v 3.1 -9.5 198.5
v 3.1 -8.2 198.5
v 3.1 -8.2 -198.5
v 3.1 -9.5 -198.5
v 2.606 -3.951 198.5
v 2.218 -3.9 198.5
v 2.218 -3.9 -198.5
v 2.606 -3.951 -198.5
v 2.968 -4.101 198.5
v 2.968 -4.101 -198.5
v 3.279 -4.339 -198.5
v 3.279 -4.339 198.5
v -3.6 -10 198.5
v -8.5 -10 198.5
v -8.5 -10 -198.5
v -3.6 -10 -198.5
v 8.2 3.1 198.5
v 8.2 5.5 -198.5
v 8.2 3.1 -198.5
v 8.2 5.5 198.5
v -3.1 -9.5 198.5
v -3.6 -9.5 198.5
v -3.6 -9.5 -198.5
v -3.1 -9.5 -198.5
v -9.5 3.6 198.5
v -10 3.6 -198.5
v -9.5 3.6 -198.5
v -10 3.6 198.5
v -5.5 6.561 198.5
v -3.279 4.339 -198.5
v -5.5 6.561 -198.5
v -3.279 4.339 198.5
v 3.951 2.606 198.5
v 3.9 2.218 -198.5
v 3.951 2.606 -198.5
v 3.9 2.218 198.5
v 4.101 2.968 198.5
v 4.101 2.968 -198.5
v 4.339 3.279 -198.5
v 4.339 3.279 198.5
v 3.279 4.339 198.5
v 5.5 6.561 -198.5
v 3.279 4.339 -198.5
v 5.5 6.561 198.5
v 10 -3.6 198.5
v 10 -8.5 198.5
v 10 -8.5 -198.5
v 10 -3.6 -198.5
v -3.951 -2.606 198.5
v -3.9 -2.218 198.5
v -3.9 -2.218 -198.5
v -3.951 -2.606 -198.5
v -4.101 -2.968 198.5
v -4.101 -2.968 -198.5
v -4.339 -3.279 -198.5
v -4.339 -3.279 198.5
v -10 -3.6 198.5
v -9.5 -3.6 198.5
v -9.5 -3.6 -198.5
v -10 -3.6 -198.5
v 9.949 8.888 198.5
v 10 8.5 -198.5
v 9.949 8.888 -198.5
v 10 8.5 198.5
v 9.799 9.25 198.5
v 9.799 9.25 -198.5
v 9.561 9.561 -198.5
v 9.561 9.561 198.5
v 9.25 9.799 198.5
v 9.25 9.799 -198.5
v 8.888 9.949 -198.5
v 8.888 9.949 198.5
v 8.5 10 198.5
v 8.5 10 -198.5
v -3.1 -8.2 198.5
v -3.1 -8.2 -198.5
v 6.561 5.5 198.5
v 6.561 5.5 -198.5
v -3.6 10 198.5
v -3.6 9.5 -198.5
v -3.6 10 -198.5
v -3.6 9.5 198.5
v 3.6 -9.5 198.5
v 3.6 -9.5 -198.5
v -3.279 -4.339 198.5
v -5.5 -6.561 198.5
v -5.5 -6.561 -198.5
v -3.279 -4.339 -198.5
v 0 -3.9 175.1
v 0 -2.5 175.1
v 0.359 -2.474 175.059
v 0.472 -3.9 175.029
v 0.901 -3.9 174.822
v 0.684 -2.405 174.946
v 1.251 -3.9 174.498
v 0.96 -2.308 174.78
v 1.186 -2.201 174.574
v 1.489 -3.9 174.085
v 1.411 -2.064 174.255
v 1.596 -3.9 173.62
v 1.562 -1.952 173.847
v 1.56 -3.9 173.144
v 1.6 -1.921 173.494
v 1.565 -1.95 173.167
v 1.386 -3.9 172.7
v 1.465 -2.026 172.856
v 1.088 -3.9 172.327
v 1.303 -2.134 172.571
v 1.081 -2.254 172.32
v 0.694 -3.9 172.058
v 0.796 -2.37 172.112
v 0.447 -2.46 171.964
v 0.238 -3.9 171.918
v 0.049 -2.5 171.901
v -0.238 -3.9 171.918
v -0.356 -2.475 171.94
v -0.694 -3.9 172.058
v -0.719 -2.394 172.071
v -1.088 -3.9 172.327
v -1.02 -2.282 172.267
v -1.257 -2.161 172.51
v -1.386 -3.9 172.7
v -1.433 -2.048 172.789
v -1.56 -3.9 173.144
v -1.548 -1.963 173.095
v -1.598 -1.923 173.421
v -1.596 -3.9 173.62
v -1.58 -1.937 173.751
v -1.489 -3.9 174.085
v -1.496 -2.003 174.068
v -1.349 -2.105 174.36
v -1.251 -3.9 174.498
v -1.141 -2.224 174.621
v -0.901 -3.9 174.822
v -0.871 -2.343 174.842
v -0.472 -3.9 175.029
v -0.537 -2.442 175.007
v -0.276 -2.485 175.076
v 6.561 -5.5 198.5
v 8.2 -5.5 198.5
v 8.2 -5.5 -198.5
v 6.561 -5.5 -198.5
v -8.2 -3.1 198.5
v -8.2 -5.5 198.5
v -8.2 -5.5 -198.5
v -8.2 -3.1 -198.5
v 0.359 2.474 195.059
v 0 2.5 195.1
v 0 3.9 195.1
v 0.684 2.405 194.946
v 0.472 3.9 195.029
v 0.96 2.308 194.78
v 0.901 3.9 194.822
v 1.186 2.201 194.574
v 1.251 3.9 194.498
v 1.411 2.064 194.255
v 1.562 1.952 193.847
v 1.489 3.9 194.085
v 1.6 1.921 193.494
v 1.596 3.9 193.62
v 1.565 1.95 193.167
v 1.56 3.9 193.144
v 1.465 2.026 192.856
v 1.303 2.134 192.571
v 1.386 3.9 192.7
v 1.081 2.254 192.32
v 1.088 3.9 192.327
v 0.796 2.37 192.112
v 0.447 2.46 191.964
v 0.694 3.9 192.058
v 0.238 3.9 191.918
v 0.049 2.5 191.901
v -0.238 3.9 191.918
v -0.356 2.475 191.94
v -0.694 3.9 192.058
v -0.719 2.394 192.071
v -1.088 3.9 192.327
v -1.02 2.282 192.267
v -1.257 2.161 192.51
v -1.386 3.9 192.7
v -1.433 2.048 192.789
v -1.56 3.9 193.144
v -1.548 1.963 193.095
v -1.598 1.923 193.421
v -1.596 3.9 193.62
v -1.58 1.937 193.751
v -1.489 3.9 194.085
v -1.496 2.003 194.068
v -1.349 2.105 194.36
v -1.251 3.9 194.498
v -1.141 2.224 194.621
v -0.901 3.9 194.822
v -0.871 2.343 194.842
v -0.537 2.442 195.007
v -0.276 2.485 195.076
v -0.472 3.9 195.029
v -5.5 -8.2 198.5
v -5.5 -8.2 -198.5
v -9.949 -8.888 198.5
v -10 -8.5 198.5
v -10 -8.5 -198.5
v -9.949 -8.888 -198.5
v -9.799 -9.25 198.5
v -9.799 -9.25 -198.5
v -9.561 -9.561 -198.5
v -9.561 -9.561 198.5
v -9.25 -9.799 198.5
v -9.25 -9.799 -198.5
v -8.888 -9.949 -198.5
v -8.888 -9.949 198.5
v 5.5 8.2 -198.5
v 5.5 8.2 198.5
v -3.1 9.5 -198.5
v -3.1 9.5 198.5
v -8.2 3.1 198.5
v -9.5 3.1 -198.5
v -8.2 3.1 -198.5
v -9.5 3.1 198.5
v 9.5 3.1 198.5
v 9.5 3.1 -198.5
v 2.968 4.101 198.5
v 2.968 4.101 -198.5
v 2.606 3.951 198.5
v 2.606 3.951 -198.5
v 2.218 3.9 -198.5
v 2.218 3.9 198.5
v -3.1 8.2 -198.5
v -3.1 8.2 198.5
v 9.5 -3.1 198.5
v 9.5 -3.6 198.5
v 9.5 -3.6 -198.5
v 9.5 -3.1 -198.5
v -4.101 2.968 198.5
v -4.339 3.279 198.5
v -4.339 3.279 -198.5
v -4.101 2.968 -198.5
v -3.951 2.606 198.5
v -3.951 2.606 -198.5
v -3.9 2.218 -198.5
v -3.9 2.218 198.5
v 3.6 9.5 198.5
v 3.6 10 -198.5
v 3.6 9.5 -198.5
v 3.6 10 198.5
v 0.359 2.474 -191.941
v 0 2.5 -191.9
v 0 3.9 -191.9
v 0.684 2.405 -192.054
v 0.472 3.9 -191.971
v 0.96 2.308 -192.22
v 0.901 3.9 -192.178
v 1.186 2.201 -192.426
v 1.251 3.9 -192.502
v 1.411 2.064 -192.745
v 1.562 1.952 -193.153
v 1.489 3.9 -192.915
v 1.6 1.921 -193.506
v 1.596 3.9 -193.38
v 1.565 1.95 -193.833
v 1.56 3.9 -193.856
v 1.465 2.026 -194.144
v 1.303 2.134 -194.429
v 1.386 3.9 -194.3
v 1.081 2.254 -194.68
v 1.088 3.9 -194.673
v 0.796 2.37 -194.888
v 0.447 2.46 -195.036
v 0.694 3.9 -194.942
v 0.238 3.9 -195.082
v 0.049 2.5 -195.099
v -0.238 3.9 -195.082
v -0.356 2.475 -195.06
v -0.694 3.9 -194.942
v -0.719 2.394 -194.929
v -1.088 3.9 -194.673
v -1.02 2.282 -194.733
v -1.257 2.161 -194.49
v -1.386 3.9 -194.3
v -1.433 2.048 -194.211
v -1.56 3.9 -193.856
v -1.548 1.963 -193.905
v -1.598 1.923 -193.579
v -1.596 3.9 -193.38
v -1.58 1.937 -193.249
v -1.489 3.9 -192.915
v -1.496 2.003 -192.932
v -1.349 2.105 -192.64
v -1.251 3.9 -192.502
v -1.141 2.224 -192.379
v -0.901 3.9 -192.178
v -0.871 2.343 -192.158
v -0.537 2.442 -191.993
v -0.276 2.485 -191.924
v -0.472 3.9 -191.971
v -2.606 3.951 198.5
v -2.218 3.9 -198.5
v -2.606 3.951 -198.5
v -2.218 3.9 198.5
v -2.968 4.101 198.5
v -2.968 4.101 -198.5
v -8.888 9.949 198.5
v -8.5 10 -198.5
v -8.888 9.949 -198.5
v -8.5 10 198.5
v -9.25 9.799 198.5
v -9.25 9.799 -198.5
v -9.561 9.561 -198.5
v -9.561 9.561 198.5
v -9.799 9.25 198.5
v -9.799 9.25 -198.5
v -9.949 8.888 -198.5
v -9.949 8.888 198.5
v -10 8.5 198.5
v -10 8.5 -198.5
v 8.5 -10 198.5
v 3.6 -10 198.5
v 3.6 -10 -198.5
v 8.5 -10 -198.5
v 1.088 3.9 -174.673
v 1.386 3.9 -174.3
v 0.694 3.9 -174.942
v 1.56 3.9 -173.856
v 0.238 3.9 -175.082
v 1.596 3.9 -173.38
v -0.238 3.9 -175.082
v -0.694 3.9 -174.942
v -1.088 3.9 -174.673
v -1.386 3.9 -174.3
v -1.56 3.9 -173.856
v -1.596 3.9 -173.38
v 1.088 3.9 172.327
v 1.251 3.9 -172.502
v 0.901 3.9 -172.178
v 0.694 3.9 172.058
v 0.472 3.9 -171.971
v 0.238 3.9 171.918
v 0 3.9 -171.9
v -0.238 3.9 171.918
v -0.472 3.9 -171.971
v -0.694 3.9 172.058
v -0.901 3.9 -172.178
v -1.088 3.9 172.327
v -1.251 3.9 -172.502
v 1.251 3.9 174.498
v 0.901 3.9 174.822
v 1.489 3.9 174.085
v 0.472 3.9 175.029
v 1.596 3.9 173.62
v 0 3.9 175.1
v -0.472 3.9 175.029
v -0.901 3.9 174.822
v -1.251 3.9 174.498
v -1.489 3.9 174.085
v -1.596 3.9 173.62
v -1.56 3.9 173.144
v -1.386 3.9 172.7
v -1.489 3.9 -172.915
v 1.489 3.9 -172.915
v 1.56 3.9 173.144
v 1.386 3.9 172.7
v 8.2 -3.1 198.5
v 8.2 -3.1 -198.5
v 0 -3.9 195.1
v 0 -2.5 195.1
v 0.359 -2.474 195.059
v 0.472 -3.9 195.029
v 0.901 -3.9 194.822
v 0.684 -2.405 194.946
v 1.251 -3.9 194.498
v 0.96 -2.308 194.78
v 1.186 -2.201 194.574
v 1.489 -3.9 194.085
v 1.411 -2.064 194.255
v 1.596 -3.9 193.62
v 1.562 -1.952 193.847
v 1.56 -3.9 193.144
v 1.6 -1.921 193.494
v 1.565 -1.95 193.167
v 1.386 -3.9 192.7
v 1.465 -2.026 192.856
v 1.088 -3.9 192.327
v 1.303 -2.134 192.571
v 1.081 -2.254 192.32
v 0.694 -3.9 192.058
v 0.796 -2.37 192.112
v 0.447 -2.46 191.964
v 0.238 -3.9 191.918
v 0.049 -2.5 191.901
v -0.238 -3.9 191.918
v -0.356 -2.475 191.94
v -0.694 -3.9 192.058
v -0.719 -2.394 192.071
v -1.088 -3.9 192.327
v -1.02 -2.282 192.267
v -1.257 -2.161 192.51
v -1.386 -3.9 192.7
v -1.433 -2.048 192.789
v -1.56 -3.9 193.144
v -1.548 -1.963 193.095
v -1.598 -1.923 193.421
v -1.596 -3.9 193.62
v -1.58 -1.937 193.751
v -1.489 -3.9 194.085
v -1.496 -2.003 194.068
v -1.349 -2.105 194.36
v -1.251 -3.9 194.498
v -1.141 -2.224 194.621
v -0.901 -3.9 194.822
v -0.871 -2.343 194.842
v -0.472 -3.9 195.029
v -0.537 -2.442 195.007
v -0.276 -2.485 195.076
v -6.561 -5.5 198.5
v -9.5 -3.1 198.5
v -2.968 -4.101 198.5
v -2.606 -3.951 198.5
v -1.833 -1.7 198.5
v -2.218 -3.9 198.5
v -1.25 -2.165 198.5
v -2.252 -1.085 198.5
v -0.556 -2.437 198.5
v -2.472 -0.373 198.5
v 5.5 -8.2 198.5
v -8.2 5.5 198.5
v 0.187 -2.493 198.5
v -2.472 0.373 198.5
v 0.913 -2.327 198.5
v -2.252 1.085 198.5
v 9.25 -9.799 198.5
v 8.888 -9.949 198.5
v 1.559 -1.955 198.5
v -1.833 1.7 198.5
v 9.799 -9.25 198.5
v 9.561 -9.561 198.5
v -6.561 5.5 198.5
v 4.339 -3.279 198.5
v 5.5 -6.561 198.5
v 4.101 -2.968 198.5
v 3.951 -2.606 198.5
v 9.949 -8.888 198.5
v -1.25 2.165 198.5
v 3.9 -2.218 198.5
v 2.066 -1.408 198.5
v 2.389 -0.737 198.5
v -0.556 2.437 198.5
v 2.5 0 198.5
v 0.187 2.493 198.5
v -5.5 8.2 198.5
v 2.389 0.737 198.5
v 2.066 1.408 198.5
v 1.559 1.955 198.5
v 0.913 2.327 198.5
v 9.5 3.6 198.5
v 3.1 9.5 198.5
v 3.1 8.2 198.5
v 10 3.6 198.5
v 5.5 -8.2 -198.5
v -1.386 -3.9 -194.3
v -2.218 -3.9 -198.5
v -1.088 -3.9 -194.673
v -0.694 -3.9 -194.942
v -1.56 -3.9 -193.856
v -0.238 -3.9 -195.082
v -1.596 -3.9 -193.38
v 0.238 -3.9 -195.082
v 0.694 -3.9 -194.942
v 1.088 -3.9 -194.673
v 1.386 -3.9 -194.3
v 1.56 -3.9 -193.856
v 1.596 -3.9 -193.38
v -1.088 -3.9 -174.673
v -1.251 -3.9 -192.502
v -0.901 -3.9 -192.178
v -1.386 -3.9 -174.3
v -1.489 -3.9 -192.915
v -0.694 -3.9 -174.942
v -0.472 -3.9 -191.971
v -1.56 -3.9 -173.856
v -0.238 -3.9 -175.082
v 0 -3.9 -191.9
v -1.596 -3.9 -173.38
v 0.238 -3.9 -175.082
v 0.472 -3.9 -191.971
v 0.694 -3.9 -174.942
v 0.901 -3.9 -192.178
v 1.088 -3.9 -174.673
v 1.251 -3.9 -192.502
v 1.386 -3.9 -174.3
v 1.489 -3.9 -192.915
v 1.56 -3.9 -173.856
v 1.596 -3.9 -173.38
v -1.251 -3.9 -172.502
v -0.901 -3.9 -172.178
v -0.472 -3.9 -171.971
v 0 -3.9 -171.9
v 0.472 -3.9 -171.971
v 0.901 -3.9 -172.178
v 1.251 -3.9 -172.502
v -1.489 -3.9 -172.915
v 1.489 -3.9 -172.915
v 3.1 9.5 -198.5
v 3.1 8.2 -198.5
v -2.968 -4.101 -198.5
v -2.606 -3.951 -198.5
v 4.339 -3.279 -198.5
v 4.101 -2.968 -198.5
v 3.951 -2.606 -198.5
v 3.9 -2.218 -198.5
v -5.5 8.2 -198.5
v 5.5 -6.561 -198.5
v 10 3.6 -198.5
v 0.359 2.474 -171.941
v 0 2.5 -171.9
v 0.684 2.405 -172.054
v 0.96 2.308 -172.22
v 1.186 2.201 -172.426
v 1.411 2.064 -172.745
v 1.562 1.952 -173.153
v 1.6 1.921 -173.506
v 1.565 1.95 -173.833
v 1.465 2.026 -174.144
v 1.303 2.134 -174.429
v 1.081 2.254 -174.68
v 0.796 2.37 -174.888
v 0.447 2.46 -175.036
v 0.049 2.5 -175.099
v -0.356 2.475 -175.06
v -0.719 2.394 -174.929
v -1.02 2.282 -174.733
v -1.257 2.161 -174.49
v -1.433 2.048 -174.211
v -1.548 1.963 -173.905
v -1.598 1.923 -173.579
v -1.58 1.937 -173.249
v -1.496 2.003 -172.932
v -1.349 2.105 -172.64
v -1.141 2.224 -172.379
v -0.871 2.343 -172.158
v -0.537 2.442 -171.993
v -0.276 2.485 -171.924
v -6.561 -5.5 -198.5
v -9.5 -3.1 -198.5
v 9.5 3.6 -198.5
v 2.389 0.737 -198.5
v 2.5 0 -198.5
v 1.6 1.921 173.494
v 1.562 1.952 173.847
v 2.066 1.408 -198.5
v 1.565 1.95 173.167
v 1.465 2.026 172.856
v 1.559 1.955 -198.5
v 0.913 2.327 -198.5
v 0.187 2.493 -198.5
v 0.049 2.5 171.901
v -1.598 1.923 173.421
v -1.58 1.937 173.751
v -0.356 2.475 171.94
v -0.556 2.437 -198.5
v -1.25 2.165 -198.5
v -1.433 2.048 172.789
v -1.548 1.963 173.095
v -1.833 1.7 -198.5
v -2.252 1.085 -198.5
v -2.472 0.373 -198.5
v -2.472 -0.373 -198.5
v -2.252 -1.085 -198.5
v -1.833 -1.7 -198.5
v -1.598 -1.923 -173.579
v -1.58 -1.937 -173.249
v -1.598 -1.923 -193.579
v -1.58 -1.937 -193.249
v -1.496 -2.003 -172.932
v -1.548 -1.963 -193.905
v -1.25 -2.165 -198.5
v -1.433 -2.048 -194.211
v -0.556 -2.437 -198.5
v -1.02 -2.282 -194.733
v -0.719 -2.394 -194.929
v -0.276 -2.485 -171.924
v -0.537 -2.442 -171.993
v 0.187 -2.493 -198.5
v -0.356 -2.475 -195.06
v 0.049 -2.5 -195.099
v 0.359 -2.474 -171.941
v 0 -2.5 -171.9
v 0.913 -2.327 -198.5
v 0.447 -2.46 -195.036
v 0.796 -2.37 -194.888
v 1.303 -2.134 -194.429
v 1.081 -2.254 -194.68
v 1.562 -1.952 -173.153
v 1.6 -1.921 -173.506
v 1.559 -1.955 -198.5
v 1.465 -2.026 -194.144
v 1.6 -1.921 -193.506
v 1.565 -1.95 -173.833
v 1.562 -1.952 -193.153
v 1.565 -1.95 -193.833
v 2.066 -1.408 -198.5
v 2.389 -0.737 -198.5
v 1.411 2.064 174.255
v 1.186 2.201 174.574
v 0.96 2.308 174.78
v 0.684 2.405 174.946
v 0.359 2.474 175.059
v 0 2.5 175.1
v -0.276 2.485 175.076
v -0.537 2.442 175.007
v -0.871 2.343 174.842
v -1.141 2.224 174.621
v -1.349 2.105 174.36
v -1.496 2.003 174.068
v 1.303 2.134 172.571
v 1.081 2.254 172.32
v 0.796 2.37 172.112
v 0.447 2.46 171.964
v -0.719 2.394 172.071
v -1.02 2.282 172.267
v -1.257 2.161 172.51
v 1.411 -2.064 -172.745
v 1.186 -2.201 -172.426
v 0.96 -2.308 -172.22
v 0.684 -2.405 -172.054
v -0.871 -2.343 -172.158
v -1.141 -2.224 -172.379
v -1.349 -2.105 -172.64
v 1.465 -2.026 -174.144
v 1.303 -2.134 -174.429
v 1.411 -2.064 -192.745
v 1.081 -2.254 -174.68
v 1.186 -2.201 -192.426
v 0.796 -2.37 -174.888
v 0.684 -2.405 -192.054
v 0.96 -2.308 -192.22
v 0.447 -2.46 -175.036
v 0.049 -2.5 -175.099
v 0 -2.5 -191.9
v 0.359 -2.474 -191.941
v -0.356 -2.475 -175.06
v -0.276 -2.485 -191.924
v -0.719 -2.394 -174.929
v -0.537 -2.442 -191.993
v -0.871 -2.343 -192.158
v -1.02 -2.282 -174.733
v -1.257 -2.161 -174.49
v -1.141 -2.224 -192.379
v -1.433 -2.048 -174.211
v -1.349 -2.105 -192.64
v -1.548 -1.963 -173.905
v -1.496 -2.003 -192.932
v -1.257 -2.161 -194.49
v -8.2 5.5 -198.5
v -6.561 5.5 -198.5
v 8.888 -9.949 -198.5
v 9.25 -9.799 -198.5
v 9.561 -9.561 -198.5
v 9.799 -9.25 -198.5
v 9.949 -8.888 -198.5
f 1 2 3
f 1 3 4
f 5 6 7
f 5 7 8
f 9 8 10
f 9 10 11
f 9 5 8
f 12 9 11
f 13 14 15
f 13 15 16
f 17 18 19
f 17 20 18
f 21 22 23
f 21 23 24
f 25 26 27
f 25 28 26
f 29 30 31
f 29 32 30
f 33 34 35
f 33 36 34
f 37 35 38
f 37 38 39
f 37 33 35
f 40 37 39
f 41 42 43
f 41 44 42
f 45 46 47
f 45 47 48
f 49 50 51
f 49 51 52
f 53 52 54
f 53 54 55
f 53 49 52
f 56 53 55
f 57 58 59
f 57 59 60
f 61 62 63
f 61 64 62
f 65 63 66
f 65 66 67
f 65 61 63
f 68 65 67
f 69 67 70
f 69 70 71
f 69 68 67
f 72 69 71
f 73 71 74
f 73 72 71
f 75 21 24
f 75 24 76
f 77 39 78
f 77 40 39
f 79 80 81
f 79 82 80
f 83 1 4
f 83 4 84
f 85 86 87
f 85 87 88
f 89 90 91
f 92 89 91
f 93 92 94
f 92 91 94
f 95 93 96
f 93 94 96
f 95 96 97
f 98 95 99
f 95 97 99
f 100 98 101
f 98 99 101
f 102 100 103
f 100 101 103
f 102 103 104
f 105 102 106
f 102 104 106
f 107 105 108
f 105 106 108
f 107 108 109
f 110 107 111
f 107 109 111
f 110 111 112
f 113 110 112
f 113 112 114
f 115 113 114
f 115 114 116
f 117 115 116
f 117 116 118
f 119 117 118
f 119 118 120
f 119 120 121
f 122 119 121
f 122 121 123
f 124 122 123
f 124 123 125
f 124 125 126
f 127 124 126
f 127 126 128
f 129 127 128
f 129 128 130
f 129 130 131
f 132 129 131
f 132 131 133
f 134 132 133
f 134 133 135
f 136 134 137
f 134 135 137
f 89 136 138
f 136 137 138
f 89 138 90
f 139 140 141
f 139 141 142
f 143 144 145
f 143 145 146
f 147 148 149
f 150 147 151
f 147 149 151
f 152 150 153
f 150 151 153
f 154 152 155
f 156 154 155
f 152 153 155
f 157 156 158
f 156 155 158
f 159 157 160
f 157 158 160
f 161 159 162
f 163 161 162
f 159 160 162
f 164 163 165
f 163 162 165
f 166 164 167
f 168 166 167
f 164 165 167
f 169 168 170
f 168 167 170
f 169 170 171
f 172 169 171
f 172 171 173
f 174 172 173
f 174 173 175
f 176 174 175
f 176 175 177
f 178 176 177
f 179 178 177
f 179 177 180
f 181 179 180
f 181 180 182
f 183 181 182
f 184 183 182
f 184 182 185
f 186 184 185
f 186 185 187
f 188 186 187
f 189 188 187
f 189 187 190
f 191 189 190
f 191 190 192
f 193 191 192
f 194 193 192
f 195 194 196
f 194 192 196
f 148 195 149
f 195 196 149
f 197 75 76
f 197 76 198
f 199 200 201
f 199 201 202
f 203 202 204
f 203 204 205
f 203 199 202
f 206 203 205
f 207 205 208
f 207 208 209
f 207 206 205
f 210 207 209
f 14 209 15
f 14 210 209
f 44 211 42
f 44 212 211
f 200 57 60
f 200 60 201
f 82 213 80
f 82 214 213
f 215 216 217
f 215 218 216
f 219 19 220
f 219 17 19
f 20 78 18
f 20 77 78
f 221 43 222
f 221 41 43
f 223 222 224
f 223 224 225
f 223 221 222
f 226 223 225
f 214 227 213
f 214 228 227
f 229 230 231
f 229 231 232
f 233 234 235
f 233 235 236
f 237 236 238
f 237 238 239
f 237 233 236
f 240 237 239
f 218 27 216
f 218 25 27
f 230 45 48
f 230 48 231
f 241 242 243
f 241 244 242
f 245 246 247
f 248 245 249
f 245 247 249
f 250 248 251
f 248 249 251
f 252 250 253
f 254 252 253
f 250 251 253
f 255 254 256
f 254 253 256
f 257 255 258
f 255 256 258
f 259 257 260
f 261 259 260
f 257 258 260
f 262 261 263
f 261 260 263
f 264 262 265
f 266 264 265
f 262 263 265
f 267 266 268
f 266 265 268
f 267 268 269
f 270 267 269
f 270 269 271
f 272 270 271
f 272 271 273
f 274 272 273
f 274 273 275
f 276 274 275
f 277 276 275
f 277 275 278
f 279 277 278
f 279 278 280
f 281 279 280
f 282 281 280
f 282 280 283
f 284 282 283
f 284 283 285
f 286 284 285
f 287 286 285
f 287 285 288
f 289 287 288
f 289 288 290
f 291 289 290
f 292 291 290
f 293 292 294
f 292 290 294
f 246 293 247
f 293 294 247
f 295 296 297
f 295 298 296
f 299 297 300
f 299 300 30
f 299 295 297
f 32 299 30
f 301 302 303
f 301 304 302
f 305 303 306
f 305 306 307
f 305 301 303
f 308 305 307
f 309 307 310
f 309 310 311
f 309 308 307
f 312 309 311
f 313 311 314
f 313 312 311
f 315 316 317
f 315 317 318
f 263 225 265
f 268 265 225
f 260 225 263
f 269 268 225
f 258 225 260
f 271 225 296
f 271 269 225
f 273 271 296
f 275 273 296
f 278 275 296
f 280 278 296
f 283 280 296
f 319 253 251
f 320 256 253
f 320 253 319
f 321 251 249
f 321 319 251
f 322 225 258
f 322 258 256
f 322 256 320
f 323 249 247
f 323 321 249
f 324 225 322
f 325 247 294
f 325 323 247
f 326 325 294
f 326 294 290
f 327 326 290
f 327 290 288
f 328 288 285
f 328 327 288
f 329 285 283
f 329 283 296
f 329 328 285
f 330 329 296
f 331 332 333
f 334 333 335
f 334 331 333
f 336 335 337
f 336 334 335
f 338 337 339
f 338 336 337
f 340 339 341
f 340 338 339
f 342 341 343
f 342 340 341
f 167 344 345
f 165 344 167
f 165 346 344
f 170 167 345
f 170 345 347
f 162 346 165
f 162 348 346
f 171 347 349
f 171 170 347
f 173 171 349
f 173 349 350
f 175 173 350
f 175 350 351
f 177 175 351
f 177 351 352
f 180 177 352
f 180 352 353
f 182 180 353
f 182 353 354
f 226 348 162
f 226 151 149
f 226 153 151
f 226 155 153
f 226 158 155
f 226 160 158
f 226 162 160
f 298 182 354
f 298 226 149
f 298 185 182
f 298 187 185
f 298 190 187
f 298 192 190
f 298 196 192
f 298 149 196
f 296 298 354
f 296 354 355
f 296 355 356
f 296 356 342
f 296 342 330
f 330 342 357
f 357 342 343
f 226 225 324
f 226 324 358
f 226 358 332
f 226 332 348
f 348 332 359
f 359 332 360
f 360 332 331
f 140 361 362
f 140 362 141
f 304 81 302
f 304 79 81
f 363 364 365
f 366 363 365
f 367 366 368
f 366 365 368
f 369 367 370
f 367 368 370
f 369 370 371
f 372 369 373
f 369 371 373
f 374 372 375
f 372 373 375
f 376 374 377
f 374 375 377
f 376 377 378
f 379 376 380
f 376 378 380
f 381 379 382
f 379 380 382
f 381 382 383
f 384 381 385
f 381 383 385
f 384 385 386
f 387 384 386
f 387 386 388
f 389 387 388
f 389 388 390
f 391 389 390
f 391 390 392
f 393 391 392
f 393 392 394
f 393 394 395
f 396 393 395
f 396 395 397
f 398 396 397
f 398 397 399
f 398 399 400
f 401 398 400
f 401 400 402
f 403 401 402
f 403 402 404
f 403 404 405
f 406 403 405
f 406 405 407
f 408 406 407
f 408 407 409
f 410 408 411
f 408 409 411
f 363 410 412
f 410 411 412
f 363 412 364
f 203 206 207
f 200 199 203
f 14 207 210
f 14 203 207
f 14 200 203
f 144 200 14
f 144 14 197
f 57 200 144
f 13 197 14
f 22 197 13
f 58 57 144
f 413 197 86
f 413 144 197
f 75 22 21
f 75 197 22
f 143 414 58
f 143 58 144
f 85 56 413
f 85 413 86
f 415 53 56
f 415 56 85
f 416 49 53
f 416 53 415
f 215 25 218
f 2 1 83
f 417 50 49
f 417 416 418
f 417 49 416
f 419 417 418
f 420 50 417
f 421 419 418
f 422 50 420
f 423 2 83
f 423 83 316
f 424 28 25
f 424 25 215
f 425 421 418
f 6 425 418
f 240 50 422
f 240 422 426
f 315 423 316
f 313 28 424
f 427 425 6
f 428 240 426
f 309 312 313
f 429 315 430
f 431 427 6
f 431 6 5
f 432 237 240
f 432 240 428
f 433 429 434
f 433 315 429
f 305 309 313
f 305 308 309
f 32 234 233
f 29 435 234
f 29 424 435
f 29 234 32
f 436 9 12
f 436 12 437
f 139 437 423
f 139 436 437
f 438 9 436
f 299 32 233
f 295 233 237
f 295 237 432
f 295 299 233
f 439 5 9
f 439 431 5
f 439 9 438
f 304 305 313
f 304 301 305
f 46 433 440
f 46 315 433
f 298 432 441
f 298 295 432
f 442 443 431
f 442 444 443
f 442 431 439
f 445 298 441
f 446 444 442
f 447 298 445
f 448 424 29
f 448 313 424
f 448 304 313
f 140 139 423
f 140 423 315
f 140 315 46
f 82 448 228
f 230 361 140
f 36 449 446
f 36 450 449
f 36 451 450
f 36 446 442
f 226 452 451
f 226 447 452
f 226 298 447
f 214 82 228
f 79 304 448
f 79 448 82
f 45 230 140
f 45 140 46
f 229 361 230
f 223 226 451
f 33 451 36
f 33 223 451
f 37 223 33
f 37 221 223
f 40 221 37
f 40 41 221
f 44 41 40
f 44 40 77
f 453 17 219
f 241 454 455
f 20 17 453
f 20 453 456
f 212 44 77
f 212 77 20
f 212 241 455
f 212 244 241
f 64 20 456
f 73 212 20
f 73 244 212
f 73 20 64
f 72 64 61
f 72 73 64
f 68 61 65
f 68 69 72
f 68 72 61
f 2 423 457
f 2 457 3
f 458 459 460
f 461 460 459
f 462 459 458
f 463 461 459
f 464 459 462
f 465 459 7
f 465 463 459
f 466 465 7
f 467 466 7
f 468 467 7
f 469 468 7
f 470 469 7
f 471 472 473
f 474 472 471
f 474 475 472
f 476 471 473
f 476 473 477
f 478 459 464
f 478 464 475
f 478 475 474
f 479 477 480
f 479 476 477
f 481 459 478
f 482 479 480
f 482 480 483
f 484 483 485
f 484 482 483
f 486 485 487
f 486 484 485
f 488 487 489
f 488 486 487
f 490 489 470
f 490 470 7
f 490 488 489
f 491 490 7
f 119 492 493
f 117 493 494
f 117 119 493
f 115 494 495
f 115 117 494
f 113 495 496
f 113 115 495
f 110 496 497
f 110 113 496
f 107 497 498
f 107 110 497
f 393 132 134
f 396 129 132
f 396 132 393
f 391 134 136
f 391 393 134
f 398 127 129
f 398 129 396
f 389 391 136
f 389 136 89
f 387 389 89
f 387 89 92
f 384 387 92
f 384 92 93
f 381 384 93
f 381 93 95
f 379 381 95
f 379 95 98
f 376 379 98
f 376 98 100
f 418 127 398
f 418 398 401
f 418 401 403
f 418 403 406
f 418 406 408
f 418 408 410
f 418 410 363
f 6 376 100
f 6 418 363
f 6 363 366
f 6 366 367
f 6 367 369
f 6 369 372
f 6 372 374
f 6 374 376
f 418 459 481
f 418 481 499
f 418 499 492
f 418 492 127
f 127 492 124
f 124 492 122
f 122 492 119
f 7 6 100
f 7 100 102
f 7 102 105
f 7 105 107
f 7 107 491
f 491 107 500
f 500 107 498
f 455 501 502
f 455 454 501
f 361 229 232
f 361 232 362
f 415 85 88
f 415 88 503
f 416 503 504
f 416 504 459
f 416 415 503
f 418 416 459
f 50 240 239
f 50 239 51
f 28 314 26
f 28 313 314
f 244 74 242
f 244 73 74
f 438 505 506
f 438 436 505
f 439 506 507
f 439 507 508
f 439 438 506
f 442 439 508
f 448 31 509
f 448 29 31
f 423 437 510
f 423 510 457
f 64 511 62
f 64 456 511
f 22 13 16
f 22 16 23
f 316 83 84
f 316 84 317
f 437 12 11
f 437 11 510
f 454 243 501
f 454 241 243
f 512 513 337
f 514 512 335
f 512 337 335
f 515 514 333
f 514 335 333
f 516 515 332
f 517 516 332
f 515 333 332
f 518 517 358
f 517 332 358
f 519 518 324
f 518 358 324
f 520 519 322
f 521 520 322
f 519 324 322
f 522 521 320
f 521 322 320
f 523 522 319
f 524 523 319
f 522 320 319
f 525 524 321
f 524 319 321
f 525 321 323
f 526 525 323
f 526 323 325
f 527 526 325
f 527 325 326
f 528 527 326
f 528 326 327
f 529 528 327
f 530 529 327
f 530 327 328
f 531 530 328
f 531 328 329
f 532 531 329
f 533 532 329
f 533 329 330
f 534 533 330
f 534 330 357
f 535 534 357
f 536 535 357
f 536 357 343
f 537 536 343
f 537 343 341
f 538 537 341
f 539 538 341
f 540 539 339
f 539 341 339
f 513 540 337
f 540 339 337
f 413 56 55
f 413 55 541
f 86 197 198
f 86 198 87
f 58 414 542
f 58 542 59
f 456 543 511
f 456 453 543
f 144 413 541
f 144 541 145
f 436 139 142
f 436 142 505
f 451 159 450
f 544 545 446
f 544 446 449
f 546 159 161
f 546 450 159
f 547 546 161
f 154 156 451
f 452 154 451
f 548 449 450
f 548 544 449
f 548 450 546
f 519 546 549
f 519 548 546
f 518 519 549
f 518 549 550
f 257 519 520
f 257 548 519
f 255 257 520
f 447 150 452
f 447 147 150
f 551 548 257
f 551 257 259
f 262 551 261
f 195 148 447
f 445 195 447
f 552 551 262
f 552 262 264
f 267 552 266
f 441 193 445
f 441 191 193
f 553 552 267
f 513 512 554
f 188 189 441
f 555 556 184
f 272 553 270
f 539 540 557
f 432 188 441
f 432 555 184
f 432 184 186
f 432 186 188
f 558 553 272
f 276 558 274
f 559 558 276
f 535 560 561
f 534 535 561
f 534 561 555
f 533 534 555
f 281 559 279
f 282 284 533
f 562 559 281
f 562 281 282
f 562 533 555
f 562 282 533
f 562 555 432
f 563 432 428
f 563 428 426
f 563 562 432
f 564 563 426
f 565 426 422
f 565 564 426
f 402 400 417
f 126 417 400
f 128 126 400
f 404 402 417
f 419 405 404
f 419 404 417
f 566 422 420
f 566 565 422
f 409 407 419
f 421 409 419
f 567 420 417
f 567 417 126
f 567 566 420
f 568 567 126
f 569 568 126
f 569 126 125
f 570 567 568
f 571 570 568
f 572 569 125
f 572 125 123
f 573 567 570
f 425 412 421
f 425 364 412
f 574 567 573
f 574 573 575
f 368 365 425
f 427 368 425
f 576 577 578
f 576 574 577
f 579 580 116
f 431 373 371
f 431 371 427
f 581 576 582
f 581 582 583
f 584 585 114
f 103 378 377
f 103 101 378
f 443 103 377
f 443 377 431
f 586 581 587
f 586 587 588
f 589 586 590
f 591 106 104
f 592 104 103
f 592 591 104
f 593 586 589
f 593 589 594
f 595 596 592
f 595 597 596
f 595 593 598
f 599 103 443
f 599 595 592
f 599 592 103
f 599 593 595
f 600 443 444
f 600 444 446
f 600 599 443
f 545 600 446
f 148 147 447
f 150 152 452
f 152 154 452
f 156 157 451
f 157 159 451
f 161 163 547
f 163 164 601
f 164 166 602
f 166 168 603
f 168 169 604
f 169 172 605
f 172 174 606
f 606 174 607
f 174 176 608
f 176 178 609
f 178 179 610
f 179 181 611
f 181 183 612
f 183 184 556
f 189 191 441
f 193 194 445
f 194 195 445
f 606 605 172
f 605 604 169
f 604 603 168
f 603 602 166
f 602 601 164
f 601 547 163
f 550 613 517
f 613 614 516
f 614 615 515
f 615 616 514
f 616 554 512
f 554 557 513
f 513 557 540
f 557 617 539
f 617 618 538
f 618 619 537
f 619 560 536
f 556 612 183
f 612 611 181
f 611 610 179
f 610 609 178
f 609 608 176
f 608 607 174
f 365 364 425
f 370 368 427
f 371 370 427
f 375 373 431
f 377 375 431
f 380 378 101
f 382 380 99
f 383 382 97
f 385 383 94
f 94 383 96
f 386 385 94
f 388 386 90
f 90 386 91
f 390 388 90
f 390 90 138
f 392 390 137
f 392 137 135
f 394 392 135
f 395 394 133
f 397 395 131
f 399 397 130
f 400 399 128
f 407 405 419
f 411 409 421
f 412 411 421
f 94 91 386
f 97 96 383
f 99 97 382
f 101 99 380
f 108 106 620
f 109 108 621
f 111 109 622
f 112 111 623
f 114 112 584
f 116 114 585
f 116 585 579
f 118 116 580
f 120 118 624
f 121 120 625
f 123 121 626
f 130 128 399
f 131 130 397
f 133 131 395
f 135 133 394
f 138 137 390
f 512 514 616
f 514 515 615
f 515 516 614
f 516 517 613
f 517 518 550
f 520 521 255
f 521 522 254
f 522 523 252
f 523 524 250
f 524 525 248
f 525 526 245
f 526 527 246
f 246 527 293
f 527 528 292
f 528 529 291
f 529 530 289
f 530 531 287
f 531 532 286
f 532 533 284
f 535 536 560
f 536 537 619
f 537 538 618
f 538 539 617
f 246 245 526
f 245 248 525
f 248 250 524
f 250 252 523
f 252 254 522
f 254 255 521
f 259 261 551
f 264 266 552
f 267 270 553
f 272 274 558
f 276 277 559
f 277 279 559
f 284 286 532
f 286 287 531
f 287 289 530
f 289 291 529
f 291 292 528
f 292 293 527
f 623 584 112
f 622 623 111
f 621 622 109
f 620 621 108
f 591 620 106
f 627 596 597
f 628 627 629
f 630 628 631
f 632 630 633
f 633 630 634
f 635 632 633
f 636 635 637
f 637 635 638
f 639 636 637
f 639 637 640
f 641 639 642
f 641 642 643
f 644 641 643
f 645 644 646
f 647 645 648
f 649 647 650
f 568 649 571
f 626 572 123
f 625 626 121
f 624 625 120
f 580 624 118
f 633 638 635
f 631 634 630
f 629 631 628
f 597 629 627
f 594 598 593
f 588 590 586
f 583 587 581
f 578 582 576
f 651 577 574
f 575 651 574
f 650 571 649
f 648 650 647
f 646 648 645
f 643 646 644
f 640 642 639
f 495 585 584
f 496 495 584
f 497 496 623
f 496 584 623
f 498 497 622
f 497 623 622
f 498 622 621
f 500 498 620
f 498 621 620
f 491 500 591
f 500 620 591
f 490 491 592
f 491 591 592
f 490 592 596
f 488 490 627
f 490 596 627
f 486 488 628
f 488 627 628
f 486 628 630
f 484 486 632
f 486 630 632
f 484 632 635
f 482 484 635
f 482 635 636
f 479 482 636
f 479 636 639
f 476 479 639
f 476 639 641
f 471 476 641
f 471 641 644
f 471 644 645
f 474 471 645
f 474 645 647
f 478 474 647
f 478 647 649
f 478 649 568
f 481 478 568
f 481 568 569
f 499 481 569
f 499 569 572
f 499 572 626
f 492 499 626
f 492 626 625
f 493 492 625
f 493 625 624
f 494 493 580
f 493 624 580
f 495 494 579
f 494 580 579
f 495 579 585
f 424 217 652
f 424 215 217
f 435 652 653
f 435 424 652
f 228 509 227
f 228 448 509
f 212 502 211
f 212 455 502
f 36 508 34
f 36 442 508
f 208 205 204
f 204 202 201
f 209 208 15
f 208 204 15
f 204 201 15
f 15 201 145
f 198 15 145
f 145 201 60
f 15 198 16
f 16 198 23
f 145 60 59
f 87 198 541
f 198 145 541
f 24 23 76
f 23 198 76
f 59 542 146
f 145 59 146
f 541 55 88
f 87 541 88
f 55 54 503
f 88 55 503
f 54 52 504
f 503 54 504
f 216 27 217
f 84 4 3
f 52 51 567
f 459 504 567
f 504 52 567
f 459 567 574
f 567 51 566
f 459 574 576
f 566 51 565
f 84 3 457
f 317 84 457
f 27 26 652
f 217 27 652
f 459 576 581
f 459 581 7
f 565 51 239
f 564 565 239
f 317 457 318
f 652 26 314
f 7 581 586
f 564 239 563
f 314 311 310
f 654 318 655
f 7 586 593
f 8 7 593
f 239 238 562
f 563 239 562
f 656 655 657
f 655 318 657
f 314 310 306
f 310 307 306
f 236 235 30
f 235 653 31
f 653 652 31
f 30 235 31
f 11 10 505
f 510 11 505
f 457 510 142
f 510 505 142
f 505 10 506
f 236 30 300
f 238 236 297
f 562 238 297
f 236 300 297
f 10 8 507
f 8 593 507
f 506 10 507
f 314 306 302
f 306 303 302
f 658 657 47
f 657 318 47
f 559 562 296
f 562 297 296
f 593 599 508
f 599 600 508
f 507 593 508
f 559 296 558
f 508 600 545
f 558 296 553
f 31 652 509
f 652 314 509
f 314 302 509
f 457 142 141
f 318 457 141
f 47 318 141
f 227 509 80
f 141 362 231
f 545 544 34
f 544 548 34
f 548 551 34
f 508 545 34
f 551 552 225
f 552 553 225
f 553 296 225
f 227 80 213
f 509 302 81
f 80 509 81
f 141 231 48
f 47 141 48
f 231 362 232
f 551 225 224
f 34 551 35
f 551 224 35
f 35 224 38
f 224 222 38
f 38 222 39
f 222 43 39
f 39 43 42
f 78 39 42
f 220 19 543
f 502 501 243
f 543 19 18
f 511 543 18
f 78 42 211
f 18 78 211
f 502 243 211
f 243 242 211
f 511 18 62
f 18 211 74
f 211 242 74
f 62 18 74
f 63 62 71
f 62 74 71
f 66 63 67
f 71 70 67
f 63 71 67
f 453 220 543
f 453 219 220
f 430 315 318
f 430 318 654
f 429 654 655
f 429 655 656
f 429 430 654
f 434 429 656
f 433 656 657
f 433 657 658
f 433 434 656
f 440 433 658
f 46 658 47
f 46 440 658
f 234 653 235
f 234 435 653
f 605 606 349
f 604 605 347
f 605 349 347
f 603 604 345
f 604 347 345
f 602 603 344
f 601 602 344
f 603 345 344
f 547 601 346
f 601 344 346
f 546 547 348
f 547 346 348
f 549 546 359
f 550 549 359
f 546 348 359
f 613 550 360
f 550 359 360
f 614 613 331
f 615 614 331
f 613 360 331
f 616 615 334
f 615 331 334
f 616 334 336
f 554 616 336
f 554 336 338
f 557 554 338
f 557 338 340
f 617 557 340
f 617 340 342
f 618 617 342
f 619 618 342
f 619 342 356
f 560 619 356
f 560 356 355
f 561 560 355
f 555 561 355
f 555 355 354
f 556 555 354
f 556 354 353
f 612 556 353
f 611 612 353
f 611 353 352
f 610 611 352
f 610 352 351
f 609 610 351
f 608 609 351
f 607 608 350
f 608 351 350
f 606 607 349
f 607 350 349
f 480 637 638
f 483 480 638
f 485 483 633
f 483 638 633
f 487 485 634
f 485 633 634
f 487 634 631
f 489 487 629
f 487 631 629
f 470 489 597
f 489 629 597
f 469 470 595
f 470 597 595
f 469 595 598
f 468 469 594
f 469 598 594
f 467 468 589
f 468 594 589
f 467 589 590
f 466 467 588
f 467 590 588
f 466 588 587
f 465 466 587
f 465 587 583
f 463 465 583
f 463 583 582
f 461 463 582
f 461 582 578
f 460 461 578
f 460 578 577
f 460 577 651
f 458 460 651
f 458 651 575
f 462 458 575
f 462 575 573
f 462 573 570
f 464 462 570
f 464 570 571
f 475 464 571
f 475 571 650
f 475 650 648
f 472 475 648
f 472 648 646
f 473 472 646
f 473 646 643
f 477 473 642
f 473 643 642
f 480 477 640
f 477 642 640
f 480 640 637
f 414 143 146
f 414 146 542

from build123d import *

# Parameters (mm, degrees)
SKETCH_1_R          = 2.5
EXTRUDE_1_DEPTH     = 198.5
SKETCH_3_R          = 1.6
CUT_EXTRUDE_1_DEPTH = 200.755475519


with BuildPart() as part:
    # 草图1 → 凸台-拉伸1 (new, symmetric)
    with BuildSketch(Plane.XY):
        with BuildLine():
            Line((-6.560660172, 5.5), (-4.339339828, 3.278679656))
            ThreePointArc((-4.339339828, 3.278679656), (-4.014180701, 2.792044633), (-3.9, 2.218019485))
            Line((-3.9, 2.218019485), (-3.9, -2.218019485))
            ThreePointArc((-3.9, -2.218019485), (-4.014180701, -2.792044633), (-4.339339828, -3.278679656))
            Line((-4.339339828, -3.278679656), (-6.560660172, -5.5))
            Line((-6.560660172, -5.5), (-8.2, -5.5))
            Line((-8.2, -5.5), (-8.2, -3.1))
            Line((-8.2, -3.1), (-9.5, -3.1))
            Line((-9.5, -3.1), (-9.5, -3.6))
            Line((-9.5, -3.6), (-10, -3.6))
            Line((-10, -3.6), (-10, -8.5))
            ThreePointArc((-10, -8.5), (-9.560660172, -9.560660172), (-8.5, -10))
            Line((-8.5, -10), (-3.6, -10))
            Line((-3.6, -10), (-3.6, -9.5))
            Line((-3.6, -9.5), (-3.1, -9.5))
            Line((-3.1, -9.5), (-3.1, -8.2))
            Line((-3.1, -8.2), (-5.5, -8.2))
            Line((-5.5, -8.2), (-5.5, -6.560660172))
            Line((-5.5, -6.560660172), (-3.278679656, -4.339339828))
            ThreePointArc((-3.278679656, -4.339339828), (-2.792044633, -4.014180701), (-2.218019485, -3.9))
            Line((-2.218019485, -3.9), (2.218019485, -3.9))
            ThreePointArc((2.218019485, -3.9), (2.792044633, -4.014180701), (3.278679656, -4.339339828))
            Line((3.278679656, -4.339339828), (5.5, -6.560660172))
            Line((5.5, -6.560660172), (5.5, -8.2))
            Line((5.5, -8.2), (3.1, -8.2))
            Line((3.1, -8.2), (3.1, -9.5))
            Line((3.1, -9.5), (3.6, -9.5))
            Line((3.6, -9.5), (3.6, -10))
            Line((3.6, -10), (8.5, -10))
            ThreePointArc((8.5, -10), (9.560660172, -9.560660172), (10, -8.5))
            Line((10, -8.5), (10, -3.6))
            Line((10, -3.6), (9.5, -3.6))
            Line((9.5, -3.6), (9.5, -3.1))
            Line((9.5, -3.1), (8.2, -3.1))
            Line((8.2, -3.1), (8.2, -5.5))
            Line((8.2, -5.5), (6.560660172, -5.5))
            Line((6.560660172, -5.5), (4.339339828, -3.278679656))
            ThreePointArc((4.339339828, -3.278679656), (4.014180701, -2.792044633), (3.9, -2.218019485))
            Line((3.9, -2.218019485), (3.9, 2.218019485))
            ThreePointArc((3.9, 2.218019485), (4.014180701, 2.792044633), (4.339339828, 3.278679656))
            Line((4.339339828, 3.278679656), (6.560660172, 5.5))
            Line((6.560660172, 5.5), (8.2, 5.5))
            Line((8.2, 5.5), (8.2, 3.1))
            Line((8.2, 3.1), (9.5, 3.1))
            Line((9.5, 3.1), (9.5, 3.6))
            Line((9.5, 3.6), (10, 3.6))
            Line((10, 3.6), (10, 8.5))
            ThreePointArc((10, 8.5), (9.560660172, 9.560660172), (8.5, 10))
            Line((8.5, 10), (3.6, 10))
            Line((3.6, 10), (3.6, 9.5))
            Line((3.6, 9.5), (3.1, 9.5))
            Line((3.1, 9.5), (3.1, 8.2))
            Line((3.1, 8.2), (5.5, 8.2))
            Line((5.5, 8.2), (5.5, 6.560660172))
            Line((5.5, 6.560660172), (3.278679656, 4.339339828))
            ThreePointArc((3.278679656, 4.339339828), (2.792044633, 4.014180701), (2.218019485, 3.9))
            Line((2.218019485, 3.9), (-2.218019485, 3.9))
            ThreePointArc((-2.218019485, 3.9), (-2.792044633, 4.014180701), (-3.278679656, 4.339339828))
            Line((-3.278679656, 4.339339828), (-5.5, 6.560660172))
            Line((-5.5, 6.560660172), (-5.5, 8.2))
            Line((-5.5, 8.2), (-3.1, 8.2))
            Line((-3.1, 8.2), (-3.1, 9.5))
            Line((-3.1, 9.5), (-3.6, 9.5))
            Line((-3.6, 9.5), (-3.6, 10))
            Line((-3.6, 10), (-8.5, 10))
            ThreePointArc((-8.5, 10), (-9.560660172, 9.560660172), (-10, 8.5))
            Line((-10, 8.5), (-10, 3.6))
            Line((-10, 3.6), (-9.5, 3.6))
            Line((-9.5, 3.6), (-9.5, 3.1))
            Line((-9.5, 3.1), (-8.2, 3.1))
            Line((-8.2, 3.1), (-8.2, 5.5))
            Line((-8.2, 5.5), (-6.560660172, 5.5))
        make_face()
        Circle(SKETCH_1_R, mode=Mode.SUBTRACT)
    extrude(amount=EXTRUDE_1_DEPTH, both=True)

    # 草图3 → 切除-拉伸1 (cut, through all)
    with BuildSketch(Plane(origin=(0, 10, 0), x_dir=(1, 0, 0), z_dir=(0, 1, 0))):
        with Locations(Location((0, 193.5, 0), (0, 0, 270))):
            Circle(SKETCH_3_R)
        with Locations(Location((0, 173.5, 0), (0, 0, 270))):
            Circle(SKETCH_3_R)
        with Locations(Location((0, -193.5, 0), (0, 0, 270))):
            Circle(SKETCH_3_R)
        with Locations(Location((0, -173.5, 0), (0, 0, 270))):
            Circle(SKETCH_3_R)
    extrude(amount=-CUT_EXTRUDE_1_DEPTH, mode=Mode.SUBTRACT)


solid = part.part
